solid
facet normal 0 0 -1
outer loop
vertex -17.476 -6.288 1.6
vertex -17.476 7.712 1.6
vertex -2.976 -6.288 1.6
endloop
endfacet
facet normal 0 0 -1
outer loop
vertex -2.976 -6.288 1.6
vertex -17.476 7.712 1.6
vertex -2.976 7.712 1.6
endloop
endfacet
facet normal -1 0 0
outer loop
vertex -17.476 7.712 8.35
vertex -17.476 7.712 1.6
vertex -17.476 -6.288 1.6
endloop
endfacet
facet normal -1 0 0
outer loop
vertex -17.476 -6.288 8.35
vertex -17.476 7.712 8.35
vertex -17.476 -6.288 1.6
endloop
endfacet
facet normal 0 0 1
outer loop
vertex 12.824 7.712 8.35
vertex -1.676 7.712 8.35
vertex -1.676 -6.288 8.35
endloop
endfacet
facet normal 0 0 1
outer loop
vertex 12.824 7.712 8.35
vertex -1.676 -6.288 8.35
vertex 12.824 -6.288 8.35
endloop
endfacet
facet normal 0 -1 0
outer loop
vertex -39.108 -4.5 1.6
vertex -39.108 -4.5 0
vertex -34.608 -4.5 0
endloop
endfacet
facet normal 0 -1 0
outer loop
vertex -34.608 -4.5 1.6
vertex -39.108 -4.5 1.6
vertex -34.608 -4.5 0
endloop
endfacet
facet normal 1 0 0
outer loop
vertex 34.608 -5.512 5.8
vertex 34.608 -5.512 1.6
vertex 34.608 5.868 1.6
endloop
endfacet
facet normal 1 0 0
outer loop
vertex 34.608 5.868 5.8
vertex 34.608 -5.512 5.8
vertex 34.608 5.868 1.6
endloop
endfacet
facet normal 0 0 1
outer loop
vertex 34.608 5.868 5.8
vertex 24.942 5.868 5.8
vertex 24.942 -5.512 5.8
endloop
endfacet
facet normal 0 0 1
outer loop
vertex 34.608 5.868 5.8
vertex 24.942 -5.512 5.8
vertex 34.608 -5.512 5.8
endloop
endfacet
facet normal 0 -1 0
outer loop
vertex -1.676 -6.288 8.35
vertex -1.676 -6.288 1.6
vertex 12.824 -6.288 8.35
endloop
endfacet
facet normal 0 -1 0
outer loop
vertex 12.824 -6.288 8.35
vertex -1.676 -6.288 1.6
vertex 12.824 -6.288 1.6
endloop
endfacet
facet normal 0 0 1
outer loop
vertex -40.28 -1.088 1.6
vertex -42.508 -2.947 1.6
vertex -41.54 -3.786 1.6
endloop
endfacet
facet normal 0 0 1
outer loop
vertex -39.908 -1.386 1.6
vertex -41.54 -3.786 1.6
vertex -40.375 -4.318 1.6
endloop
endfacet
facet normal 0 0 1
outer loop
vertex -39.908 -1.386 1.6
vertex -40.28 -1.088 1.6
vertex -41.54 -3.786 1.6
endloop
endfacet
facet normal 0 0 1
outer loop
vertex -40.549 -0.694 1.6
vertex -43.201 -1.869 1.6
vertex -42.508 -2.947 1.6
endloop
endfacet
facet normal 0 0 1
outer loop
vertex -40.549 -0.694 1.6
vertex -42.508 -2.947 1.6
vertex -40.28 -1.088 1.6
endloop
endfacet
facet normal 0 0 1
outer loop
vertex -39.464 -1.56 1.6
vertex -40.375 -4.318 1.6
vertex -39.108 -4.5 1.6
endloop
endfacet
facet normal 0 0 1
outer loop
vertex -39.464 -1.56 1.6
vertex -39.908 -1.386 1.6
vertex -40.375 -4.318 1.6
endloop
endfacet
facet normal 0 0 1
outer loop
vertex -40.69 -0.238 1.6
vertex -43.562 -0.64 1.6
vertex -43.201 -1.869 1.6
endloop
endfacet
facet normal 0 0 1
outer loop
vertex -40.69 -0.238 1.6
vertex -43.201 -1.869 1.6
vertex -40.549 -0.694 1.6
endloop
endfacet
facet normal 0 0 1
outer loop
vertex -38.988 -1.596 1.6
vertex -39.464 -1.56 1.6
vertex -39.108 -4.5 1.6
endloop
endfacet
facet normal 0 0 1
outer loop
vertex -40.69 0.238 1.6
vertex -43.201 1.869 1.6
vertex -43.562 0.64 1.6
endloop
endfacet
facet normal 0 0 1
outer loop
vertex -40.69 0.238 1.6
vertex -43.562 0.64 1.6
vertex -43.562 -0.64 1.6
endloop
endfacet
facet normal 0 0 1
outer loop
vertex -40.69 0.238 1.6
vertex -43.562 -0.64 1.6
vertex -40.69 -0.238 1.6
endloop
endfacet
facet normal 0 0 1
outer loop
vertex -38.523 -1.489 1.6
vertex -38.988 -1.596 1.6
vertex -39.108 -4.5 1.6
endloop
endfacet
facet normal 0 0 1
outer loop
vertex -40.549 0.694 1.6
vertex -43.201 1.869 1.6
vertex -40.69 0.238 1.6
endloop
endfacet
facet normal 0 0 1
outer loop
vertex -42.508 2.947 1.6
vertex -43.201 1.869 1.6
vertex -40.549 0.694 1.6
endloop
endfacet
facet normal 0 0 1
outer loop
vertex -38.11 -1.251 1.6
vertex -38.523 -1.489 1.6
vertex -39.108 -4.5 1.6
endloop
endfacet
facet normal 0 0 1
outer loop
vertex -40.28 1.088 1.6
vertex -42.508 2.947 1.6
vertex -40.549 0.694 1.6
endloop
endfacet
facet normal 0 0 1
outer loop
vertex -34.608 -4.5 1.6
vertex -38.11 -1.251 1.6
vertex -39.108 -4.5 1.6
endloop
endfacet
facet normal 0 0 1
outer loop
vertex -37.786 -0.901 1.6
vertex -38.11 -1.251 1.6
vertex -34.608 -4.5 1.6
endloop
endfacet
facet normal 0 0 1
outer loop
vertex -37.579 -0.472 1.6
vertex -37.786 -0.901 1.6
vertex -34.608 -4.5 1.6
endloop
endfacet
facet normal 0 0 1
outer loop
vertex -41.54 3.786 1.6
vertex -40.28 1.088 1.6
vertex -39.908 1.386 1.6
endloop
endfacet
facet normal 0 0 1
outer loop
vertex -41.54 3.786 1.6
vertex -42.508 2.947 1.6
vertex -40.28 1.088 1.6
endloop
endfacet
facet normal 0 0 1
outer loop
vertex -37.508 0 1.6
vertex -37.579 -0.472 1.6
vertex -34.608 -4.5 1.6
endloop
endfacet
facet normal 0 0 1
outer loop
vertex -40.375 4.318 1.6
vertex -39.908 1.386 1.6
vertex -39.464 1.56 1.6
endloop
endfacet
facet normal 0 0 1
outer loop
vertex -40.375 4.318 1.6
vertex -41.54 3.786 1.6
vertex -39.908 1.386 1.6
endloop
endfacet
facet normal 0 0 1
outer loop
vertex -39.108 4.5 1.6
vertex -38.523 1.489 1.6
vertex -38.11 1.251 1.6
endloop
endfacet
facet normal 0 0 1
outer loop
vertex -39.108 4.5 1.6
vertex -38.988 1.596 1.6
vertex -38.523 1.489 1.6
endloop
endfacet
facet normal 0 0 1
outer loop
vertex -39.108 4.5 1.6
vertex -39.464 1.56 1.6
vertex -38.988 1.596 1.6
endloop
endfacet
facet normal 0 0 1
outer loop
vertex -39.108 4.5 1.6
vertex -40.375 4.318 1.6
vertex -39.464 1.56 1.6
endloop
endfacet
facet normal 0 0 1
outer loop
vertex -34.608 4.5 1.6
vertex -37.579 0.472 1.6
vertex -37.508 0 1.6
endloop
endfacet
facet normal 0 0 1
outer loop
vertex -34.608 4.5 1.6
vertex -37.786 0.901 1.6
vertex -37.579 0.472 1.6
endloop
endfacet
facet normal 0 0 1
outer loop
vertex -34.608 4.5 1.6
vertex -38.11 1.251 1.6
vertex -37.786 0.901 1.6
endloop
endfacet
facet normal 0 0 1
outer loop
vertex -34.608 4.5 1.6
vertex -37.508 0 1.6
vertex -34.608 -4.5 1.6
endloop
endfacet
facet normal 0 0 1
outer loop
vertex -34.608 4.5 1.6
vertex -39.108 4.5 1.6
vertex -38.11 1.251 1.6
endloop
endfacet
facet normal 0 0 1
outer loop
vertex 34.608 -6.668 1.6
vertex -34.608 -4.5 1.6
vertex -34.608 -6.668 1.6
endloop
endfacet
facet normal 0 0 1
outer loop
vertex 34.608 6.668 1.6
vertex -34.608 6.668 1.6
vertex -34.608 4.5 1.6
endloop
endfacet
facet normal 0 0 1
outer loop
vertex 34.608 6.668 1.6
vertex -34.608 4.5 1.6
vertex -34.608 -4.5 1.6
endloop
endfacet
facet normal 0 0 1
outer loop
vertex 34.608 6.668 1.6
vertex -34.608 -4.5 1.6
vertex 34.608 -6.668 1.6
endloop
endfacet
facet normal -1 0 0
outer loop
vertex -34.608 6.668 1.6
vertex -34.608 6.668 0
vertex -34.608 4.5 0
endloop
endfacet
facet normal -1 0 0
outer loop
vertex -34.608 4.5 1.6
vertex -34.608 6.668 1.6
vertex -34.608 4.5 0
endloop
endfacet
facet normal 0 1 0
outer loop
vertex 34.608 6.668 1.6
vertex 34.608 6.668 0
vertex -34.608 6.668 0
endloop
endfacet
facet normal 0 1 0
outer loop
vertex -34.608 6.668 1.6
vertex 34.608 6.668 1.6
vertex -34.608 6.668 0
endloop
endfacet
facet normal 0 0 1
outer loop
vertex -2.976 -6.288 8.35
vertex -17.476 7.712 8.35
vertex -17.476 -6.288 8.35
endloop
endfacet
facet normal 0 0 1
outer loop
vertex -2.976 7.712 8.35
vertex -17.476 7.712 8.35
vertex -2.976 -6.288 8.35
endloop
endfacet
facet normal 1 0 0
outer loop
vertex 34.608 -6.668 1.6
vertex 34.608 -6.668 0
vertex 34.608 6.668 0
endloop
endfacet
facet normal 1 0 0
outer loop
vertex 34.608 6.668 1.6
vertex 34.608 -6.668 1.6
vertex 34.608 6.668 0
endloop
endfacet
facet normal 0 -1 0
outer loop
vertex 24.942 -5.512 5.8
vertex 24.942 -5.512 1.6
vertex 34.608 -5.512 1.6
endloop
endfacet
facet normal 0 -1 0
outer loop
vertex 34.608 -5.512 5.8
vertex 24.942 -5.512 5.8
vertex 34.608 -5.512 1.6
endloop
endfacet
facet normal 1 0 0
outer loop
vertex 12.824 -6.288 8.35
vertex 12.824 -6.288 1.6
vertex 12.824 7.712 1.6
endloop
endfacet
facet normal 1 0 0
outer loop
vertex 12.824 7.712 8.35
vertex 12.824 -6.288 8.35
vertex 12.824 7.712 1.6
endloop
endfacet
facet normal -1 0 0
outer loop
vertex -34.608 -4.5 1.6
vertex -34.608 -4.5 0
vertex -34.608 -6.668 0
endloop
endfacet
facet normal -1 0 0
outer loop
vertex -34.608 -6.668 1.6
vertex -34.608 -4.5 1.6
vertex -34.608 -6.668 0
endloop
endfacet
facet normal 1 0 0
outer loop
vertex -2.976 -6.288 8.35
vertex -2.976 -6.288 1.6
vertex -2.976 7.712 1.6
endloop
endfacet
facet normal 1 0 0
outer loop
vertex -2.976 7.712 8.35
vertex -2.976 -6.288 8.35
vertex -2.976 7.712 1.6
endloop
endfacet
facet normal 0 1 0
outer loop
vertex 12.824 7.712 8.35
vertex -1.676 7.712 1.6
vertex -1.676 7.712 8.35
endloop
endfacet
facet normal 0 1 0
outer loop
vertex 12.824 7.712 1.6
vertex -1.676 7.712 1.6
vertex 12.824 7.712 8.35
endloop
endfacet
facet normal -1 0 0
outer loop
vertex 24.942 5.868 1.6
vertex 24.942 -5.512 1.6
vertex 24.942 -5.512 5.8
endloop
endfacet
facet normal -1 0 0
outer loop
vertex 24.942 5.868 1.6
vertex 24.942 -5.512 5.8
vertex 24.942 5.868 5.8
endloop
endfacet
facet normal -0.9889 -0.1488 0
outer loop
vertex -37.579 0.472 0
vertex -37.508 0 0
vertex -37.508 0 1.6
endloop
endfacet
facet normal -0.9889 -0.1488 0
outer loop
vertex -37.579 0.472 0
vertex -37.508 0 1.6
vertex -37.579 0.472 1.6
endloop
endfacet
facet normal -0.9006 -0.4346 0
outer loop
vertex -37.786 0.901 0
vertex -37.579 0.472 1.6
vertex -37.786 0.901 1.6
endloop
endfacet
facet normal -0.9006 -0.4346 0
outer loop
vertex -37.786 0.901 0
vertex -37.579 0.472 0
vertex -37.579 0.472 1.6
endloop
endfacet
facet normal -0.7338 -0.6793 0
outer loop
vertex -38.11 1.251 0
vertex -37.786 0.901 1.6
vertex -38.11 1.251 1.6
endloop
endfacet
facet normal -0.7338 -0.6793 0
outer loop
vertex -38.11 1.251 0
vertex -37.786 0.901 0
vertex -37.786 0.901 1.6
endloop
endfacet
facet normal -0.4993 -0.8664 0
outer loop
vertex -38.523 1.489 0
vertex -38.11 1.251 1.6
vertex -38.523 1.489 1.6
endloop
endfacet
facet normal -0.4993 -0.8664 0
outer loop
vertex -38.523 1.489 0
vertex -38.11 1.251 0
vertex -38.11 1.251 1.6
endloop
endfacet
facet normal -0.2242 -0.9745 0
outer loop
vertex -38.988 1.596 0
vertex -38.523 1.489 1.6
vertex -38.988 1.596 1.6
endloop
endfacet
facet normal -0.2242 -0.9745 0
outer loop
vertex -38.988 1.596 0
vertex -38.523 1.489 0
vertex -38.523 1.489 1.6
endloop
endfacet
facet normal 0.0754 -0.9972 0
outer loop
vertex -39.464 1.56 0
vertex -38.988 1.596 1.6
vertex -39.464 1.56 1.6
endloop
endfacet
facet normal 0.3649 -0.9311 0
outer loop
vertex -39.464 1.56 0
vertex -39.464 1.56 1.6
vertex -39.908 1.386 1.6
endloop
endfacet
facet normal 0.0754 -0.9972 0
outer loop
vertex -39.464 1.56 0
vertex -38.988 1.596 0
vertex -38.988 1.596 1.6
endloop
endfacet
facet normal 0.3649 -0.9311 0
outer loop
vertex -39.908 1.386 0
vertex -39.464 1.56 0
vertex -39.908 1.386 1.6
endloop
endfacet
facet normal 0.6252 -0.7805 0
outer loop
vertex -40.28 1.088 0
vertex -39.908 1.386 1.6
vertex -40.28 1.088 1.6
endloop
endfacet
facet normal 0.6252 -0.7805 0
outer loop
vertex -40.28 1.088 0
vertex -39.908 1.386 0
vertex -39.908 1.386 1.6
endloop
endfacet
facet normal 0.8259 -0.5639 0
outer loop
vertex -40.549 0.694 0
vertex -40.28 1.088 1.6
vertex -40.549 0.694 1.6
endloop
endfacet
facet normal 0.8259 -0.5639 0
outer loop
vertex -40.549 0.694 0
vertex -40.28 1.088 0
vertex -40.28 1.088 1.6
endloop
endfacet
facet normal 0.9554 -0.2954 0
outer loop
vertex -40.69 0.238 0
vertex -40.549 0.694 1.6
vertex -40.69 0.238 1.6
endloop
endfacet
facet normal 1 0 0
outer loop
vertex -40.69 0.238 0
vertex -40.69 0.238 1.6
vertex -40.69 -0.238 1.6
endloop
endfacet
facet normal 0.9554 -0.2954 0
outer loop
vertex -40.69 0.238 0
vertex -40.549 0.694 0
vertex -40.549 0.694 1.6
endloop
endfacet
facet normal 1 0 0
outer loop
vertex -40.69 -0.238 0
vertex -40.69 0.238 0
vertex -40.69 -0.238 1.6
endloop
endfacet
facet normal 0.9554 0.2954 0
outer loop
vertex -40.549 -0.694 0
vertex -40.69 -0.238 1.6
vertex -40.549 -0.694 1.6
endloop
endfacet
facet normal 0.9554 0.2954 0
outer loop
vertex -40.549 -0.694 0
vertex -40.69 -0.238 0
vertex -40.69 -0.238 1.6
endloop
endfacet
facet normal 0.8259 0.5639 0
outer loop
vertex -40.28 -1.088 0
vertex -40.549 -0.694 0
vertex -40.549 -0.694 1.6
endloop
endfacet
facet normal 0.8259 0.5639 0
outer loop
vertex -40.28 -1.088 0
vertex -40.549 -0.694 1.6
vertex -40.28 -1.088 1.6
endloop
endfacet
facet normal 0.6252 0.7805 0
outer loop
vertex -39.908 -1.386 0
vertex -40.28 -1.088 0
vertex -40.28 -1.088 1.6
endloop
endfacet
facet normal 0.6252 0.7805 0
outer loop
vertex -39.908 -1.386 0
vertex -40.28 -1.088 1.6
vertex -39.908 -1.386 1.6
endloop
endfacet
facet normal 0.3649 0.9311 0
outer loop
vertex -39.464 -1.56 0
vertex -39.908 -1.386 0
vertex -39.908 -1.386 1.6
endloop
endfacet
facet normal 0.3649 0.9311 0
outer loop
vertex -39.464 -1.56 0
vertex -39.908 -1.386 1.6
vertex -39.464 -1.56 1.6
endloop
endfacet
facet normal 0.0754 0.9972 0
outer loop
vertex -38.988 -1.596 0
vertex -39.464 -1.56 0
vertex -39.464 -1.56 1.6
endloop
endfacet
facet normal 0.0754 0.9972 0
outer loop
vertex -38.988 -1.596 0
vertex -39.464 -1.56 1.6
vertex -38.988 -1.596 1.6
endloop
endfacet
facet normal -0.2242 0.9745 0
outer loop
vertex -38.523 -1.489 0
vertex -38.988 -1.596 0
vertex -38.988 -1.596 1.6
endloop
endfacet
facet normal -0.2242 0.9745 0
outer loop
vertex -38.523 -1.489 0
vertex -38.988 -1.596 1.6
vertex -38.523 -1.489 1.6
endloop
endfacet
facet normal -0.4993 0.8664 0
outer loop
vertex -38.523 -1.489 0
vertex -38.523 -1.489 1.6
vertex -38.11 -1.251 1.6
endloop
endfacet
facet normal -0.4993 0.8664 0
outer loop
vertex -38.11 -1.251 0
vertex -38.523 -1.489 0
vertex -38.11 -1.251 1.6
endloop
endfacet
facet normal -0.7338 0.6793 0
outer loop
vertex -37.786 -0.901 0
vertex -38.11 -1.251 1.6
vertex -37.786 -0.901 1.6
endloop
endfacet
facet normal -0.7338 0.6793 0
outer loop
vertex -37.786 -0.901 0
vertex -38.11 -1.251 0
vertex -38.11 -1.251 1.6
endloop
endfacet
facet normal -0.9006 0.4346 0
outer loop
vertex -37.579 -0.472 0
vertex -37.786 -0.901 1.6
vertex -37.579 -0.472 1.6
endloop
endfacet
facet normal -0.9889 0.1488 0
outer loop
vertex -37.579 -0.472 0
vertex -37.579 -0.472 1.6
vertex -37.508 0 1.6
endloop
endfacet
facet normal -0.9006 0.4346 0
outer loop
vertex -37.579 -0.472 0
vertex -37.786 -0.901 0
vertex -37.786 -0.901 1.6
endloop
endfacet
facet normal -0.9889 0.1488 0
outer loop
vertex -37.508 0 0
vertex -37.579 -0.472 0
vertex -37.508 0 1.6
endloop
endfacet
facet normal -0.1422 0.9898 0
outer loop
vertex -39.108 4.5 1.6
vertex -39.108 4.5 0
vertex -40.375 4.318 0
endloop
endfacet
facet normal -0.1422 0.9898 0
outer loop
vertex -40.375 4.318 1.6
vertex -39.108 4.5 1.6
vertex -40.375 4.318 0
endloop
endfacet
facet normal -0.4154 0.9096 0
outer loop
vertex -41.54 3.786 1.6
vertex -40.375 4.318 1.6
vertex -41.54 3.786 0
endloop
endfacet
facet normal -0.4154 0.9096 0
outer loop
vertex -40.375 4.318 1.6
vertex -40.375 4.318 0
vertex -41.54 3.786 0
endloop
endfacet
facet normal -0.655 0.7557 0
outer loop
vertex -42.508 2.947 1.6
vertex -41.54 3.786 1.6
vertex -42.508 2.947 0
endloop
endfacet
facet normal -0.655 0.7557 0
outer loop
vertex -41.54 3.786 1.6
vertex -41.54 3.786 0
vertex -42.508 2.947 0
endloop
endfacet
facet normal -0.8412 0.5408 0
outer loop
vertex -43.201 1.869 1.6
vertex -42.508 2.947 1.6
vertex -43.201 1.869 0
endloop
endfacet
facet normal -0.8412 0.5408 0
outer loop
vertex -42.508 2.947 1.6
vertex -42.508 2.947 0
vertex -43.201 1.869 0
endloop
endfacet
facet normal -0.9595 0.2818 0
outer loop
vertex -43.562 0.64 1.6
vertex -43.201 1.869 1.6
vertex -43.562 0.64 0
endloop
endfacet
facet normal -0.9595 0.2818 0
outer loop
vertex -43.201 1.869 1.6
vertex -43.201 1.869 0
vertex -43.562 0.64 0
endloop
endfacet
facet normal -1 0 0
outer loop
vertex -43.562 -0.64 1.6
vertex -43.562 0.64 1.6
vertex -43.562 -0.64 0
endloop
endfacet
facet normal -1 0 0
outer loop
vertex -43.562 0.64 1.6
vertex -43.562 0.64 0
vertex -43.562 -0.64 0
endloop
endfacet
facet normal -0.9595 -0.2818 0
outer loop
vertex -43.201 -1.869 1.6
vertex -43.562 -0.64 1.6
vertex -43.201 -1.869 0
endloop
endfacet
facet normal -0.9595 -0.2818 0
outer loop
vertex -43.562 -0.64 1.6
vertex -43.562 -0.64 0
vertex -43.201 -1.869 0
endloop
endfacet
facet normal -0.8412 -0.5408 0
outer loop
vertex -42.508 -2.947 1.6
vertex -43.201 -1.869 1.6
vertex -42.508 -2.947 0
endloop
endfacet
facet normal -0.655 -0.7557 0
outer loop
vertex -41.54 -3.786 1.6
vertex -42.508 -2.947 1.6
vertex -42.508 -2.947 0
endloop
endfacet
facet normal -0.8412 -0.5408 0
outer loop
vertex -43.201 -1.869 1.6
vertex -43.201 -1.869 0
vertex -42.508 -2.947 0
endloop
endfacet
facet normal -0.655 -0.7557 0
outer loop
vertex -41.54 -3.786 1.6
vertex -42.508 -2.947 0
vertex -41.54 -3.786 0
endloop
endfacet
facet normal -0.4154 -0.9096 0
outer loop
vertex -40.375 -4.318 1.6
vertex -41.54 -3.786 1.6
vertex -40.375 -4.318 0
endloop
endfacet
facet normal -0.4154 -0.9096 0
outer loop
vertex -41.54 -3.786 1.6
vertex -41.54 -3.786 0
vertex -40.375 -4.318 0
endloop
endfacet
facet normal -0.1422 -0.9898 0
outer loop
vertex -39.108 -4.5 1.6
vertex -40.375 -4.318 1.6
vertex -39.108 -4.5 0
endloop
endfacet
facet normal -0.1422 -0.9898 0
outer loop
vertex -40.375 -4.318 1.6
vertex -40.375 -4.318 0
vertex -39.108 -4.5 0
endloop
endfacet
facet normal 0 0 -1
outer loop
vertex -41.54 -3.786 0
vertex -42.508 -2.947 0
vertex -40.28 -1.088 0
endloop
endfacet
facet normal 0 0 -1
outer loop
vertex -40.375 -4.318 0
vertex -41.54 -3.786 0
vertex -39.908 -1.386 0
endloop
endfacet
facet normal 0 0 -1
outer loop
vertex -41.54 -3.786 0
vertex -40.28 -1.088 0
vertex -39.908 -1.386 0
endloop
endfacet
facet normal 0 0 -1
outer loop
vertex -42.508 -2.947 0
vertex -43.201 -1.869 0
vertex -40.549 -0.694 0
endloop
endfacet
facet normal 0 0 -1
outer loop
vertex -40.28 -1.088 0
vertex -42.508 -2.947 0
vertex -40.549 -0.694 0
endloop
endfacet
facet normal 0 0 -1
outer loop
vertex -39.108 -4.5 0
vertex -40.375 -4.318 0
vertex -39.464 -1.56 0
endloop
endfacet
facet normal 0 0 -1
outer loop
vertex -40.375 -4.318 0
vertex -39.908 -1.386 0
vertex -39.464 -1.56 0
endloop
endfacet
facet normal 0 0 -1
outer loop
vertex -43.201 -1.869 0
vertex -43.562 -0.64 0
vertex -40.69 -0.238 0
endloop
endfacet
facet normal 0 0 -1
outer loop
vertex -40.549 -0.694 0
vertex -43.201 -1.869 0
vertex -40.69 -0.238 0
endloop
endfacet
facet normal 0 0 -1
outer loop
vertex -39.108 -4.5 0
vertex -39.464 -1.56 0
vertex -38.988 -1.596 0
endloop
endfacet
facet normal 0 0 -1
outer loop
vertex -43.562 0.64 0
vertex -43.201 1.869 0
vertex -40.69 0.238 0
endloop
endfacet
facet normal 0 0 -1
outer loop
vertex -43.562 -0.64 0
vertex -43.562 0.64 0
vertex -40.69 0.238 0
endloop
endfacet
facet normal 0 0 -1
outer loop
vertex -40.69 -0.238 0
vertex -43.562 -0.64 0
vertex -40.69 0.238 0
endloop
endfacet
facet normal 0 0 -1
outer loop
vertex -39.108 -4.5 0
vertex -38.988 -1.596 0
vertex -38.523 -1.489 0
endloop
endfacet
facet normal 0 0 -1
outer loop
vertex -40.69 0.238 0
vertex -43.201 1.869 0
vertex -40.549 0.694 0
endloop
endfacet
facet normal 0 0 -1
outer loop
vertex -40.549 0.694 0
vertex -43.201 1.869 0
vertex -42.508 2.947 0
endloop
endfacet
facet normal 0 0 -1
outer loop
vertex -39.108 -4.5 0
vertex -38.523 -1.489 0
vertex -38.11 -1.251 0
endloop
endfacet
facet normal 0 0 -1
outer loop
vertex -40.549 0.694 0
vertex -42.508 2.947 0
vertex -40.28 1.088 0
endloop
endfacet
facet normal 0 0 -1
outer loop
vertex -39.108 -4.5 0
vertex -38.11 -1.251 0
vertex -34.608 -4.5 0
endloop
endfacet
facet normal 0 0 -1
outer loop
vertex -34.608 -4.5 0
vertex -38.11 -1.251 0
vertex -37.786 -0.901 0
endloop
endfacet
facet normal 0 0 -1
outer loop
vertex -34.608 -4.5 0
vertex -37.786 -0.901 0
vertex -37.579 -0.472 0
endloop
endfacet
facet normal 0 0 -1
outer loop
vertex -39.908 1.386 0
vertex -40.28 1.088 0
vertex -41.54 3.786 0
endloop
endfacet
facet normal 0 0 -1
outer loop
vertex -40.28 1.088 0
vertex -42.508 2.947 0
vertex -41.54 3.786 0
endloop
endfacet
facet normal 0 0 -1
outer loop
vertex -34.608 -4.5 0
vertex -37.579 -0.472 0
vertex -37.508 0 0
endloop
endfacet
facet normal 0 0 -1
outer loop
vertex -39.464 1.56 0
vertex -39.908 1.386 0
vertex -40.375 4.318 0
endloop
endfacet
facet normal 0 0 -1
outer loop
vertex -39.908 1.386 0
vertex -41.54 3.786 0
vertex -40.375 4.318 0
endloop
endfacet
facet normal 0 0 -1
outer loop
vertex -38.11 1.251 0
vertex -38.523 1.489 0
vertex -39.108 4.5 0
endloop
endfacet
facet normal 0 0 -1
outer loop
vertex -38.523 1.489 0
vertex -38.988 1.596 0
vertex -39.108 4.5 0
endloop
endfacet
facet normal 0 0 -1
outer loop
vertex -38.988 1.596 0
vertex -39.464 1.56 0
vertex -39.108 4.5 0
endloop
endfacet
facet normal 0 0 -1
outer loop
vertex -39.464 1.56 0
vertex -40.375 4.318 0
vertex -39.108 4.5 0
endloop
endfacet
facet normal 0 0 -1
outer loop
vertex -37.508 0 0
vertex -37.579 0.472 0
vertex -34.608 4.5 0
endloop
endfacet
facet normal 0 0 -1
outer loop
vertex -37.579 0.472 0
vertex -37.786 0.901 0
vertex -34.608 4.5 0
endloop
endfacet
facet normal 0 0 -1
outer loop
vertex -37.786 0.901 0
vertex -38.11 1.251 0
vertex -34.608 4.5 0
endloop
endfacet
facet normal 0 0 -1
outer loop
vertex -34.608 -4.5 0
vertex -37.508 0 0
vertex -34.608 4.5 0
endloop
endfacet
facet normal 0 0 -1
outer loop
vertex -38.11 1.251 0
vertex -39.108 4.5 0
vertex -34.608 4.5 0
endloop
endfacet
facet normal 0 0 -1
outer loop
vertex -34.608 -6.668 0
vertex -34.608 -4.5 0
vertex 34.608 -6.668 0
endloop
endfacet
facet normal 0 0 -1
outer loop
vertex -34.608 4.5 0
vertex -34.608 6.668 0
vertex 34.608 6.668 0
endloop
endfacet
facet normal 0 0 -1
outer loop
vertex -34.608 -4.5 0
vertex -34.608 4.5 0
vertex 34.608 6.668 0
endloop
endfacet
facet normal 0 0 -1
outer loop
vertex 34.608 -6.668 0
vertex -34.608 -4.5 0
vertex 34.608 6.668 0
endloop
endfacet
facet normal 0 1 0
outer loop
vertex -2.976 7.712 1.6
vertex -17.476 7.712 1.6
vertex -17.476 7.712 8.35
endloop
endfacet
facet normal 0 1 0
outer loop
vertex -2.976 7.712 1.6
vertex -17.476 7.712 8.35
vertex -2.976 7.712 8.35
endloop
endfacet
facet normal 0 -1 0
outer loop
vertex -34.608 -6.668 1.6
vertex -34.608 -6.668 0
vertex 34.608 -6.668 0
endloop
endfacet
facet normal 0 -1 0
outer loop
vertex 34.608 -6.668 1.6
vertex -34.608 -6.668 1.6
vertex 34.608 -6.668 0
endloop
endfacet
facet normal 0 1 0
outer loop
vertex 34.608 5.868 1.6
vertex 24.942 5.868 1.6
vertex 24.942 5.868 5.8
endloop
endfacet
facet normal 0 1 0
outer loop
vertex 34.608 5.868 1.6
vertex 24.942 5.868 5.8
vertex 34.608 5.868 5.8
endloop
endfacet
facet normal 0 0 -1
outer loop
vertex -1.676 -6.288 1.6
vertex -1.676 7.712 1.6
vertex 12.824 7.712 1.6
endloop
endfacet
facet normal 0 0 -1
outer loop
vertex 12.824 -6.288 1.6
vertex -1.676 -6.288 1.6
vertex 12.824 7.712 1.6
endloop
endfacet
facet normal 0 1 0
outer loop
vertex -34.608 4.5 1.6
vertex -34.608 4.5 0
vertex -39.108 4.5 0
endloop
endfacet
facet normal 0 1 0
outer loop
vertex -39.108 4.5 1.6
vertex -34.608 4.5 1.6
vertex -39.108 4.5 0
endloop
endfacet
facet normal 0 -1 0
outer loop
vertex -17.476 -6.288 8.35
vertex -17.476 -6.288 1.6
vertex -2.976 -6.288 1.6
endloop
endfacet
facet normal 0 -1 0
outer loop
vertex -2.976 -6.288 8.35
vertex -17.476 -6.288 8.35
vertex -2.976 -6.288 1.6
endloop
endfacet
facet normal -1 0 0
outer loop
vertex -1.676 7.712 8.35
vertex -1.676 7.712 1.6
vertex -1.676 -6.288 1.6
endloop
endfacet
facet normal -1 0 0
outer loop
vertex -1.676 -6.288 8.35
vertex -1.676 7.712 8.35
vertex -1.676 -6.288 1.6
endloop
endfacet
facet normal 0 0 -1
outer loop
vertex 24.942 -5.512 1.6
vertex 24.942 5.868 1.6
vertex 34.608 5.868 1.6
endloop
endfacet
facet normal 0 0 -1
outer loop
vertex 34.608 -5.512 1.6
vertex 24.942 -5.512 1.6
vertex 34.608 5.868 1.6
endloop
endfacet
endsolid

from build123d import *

# Parameters (mm, degrees)
F0_R     = 1.6
F1_DEPTH = 1.6
F2_W     = 14.5
F2_H     = 12.955
F2_H_2   = 1.045
F3_DEPTH = 6.75
F4_W     = 9.665
F4_H     = 11.379
F5_DEPTH = 4.2


with BuildPart() as f1:
    # F0 (on Top) → F1 (new body)
    with BuildSketch(Plane.XY):
        Polygon((34.6075, 6.6675), (-34.6075, 6.6675), (-34.6075, 4.5), (-34.6075, 0), (-34.6075, -4.5), (-34.6075, -6.6675), (34.6075, -6.6675), align=None)
        with BuildLine():
            Line((-34.6075, 0), (-34.6075, 4.5))
            Line((-34.6075, 4.5), (-39.1075, 4.5))
            ThreePointArc((-39.1075, 4.5), (-35.925519, 3.181981), (-34.6075, 0))
        make_face()
        with BuildLine():
            ThreePointArc((-39.1075, -4.5), (-35.925519, -3.181981), (-34.6075, 0))
            ThreePointArc((-34.6075, 0), (-35.925519, 3.181981), (-39.1075, 4.5))
            ThreePointArc((-39.1075, 4.5), (-43.6075, 0), (-39.1075, -4.5))
        make_face()
        with Locations((-39.1075, 0)):
            Circle(F0_R, mode=Mode.SUBTRACT)
        with BuildLine():
            Line((-34.6075, -4.5), (-34.6075, 0))
            ThreePointArc((-34.6075, 0), (-35.925519, -3.181981), (-39.1075, -4.5))
            Line((-39.1075, -4.5), (-34.6075, -4.5))
        make_face()
    extrude(amount=F1_DEPTH)


with BuildPart() as f3:
    # F2 (on face) → F3 (new body)
    with BuildSketch(Plane.XY.offset(1.6)):
        with Locations((-10.2255, 0.19)):
            Rectangle(F2_W, F2_H)
        with Locations((-10.2255, 7.19)):
            Rectangle(F2_W, F2_H_2)
        with Locations((5.5745, 7.19)):
            Rectangle(F2_W, F2_H_2)
        with Locations((5.5745, 0.19)):
            Rectangle(F2_W, F2_H)
    extrude(amount=F3_DEPTH)


with BuildPart() as f5:
    # F4 (on face) → F5 (new body)
    with BuildSketch(Plane.XY.offset(1.6)):
        with Locations((29.775, 0.178)):
            Rectangle(F4_W, F4_H)
    extrude(amount=F5_DEPTH)


solid = Compound([f1.part, f3.part, f5.part])
